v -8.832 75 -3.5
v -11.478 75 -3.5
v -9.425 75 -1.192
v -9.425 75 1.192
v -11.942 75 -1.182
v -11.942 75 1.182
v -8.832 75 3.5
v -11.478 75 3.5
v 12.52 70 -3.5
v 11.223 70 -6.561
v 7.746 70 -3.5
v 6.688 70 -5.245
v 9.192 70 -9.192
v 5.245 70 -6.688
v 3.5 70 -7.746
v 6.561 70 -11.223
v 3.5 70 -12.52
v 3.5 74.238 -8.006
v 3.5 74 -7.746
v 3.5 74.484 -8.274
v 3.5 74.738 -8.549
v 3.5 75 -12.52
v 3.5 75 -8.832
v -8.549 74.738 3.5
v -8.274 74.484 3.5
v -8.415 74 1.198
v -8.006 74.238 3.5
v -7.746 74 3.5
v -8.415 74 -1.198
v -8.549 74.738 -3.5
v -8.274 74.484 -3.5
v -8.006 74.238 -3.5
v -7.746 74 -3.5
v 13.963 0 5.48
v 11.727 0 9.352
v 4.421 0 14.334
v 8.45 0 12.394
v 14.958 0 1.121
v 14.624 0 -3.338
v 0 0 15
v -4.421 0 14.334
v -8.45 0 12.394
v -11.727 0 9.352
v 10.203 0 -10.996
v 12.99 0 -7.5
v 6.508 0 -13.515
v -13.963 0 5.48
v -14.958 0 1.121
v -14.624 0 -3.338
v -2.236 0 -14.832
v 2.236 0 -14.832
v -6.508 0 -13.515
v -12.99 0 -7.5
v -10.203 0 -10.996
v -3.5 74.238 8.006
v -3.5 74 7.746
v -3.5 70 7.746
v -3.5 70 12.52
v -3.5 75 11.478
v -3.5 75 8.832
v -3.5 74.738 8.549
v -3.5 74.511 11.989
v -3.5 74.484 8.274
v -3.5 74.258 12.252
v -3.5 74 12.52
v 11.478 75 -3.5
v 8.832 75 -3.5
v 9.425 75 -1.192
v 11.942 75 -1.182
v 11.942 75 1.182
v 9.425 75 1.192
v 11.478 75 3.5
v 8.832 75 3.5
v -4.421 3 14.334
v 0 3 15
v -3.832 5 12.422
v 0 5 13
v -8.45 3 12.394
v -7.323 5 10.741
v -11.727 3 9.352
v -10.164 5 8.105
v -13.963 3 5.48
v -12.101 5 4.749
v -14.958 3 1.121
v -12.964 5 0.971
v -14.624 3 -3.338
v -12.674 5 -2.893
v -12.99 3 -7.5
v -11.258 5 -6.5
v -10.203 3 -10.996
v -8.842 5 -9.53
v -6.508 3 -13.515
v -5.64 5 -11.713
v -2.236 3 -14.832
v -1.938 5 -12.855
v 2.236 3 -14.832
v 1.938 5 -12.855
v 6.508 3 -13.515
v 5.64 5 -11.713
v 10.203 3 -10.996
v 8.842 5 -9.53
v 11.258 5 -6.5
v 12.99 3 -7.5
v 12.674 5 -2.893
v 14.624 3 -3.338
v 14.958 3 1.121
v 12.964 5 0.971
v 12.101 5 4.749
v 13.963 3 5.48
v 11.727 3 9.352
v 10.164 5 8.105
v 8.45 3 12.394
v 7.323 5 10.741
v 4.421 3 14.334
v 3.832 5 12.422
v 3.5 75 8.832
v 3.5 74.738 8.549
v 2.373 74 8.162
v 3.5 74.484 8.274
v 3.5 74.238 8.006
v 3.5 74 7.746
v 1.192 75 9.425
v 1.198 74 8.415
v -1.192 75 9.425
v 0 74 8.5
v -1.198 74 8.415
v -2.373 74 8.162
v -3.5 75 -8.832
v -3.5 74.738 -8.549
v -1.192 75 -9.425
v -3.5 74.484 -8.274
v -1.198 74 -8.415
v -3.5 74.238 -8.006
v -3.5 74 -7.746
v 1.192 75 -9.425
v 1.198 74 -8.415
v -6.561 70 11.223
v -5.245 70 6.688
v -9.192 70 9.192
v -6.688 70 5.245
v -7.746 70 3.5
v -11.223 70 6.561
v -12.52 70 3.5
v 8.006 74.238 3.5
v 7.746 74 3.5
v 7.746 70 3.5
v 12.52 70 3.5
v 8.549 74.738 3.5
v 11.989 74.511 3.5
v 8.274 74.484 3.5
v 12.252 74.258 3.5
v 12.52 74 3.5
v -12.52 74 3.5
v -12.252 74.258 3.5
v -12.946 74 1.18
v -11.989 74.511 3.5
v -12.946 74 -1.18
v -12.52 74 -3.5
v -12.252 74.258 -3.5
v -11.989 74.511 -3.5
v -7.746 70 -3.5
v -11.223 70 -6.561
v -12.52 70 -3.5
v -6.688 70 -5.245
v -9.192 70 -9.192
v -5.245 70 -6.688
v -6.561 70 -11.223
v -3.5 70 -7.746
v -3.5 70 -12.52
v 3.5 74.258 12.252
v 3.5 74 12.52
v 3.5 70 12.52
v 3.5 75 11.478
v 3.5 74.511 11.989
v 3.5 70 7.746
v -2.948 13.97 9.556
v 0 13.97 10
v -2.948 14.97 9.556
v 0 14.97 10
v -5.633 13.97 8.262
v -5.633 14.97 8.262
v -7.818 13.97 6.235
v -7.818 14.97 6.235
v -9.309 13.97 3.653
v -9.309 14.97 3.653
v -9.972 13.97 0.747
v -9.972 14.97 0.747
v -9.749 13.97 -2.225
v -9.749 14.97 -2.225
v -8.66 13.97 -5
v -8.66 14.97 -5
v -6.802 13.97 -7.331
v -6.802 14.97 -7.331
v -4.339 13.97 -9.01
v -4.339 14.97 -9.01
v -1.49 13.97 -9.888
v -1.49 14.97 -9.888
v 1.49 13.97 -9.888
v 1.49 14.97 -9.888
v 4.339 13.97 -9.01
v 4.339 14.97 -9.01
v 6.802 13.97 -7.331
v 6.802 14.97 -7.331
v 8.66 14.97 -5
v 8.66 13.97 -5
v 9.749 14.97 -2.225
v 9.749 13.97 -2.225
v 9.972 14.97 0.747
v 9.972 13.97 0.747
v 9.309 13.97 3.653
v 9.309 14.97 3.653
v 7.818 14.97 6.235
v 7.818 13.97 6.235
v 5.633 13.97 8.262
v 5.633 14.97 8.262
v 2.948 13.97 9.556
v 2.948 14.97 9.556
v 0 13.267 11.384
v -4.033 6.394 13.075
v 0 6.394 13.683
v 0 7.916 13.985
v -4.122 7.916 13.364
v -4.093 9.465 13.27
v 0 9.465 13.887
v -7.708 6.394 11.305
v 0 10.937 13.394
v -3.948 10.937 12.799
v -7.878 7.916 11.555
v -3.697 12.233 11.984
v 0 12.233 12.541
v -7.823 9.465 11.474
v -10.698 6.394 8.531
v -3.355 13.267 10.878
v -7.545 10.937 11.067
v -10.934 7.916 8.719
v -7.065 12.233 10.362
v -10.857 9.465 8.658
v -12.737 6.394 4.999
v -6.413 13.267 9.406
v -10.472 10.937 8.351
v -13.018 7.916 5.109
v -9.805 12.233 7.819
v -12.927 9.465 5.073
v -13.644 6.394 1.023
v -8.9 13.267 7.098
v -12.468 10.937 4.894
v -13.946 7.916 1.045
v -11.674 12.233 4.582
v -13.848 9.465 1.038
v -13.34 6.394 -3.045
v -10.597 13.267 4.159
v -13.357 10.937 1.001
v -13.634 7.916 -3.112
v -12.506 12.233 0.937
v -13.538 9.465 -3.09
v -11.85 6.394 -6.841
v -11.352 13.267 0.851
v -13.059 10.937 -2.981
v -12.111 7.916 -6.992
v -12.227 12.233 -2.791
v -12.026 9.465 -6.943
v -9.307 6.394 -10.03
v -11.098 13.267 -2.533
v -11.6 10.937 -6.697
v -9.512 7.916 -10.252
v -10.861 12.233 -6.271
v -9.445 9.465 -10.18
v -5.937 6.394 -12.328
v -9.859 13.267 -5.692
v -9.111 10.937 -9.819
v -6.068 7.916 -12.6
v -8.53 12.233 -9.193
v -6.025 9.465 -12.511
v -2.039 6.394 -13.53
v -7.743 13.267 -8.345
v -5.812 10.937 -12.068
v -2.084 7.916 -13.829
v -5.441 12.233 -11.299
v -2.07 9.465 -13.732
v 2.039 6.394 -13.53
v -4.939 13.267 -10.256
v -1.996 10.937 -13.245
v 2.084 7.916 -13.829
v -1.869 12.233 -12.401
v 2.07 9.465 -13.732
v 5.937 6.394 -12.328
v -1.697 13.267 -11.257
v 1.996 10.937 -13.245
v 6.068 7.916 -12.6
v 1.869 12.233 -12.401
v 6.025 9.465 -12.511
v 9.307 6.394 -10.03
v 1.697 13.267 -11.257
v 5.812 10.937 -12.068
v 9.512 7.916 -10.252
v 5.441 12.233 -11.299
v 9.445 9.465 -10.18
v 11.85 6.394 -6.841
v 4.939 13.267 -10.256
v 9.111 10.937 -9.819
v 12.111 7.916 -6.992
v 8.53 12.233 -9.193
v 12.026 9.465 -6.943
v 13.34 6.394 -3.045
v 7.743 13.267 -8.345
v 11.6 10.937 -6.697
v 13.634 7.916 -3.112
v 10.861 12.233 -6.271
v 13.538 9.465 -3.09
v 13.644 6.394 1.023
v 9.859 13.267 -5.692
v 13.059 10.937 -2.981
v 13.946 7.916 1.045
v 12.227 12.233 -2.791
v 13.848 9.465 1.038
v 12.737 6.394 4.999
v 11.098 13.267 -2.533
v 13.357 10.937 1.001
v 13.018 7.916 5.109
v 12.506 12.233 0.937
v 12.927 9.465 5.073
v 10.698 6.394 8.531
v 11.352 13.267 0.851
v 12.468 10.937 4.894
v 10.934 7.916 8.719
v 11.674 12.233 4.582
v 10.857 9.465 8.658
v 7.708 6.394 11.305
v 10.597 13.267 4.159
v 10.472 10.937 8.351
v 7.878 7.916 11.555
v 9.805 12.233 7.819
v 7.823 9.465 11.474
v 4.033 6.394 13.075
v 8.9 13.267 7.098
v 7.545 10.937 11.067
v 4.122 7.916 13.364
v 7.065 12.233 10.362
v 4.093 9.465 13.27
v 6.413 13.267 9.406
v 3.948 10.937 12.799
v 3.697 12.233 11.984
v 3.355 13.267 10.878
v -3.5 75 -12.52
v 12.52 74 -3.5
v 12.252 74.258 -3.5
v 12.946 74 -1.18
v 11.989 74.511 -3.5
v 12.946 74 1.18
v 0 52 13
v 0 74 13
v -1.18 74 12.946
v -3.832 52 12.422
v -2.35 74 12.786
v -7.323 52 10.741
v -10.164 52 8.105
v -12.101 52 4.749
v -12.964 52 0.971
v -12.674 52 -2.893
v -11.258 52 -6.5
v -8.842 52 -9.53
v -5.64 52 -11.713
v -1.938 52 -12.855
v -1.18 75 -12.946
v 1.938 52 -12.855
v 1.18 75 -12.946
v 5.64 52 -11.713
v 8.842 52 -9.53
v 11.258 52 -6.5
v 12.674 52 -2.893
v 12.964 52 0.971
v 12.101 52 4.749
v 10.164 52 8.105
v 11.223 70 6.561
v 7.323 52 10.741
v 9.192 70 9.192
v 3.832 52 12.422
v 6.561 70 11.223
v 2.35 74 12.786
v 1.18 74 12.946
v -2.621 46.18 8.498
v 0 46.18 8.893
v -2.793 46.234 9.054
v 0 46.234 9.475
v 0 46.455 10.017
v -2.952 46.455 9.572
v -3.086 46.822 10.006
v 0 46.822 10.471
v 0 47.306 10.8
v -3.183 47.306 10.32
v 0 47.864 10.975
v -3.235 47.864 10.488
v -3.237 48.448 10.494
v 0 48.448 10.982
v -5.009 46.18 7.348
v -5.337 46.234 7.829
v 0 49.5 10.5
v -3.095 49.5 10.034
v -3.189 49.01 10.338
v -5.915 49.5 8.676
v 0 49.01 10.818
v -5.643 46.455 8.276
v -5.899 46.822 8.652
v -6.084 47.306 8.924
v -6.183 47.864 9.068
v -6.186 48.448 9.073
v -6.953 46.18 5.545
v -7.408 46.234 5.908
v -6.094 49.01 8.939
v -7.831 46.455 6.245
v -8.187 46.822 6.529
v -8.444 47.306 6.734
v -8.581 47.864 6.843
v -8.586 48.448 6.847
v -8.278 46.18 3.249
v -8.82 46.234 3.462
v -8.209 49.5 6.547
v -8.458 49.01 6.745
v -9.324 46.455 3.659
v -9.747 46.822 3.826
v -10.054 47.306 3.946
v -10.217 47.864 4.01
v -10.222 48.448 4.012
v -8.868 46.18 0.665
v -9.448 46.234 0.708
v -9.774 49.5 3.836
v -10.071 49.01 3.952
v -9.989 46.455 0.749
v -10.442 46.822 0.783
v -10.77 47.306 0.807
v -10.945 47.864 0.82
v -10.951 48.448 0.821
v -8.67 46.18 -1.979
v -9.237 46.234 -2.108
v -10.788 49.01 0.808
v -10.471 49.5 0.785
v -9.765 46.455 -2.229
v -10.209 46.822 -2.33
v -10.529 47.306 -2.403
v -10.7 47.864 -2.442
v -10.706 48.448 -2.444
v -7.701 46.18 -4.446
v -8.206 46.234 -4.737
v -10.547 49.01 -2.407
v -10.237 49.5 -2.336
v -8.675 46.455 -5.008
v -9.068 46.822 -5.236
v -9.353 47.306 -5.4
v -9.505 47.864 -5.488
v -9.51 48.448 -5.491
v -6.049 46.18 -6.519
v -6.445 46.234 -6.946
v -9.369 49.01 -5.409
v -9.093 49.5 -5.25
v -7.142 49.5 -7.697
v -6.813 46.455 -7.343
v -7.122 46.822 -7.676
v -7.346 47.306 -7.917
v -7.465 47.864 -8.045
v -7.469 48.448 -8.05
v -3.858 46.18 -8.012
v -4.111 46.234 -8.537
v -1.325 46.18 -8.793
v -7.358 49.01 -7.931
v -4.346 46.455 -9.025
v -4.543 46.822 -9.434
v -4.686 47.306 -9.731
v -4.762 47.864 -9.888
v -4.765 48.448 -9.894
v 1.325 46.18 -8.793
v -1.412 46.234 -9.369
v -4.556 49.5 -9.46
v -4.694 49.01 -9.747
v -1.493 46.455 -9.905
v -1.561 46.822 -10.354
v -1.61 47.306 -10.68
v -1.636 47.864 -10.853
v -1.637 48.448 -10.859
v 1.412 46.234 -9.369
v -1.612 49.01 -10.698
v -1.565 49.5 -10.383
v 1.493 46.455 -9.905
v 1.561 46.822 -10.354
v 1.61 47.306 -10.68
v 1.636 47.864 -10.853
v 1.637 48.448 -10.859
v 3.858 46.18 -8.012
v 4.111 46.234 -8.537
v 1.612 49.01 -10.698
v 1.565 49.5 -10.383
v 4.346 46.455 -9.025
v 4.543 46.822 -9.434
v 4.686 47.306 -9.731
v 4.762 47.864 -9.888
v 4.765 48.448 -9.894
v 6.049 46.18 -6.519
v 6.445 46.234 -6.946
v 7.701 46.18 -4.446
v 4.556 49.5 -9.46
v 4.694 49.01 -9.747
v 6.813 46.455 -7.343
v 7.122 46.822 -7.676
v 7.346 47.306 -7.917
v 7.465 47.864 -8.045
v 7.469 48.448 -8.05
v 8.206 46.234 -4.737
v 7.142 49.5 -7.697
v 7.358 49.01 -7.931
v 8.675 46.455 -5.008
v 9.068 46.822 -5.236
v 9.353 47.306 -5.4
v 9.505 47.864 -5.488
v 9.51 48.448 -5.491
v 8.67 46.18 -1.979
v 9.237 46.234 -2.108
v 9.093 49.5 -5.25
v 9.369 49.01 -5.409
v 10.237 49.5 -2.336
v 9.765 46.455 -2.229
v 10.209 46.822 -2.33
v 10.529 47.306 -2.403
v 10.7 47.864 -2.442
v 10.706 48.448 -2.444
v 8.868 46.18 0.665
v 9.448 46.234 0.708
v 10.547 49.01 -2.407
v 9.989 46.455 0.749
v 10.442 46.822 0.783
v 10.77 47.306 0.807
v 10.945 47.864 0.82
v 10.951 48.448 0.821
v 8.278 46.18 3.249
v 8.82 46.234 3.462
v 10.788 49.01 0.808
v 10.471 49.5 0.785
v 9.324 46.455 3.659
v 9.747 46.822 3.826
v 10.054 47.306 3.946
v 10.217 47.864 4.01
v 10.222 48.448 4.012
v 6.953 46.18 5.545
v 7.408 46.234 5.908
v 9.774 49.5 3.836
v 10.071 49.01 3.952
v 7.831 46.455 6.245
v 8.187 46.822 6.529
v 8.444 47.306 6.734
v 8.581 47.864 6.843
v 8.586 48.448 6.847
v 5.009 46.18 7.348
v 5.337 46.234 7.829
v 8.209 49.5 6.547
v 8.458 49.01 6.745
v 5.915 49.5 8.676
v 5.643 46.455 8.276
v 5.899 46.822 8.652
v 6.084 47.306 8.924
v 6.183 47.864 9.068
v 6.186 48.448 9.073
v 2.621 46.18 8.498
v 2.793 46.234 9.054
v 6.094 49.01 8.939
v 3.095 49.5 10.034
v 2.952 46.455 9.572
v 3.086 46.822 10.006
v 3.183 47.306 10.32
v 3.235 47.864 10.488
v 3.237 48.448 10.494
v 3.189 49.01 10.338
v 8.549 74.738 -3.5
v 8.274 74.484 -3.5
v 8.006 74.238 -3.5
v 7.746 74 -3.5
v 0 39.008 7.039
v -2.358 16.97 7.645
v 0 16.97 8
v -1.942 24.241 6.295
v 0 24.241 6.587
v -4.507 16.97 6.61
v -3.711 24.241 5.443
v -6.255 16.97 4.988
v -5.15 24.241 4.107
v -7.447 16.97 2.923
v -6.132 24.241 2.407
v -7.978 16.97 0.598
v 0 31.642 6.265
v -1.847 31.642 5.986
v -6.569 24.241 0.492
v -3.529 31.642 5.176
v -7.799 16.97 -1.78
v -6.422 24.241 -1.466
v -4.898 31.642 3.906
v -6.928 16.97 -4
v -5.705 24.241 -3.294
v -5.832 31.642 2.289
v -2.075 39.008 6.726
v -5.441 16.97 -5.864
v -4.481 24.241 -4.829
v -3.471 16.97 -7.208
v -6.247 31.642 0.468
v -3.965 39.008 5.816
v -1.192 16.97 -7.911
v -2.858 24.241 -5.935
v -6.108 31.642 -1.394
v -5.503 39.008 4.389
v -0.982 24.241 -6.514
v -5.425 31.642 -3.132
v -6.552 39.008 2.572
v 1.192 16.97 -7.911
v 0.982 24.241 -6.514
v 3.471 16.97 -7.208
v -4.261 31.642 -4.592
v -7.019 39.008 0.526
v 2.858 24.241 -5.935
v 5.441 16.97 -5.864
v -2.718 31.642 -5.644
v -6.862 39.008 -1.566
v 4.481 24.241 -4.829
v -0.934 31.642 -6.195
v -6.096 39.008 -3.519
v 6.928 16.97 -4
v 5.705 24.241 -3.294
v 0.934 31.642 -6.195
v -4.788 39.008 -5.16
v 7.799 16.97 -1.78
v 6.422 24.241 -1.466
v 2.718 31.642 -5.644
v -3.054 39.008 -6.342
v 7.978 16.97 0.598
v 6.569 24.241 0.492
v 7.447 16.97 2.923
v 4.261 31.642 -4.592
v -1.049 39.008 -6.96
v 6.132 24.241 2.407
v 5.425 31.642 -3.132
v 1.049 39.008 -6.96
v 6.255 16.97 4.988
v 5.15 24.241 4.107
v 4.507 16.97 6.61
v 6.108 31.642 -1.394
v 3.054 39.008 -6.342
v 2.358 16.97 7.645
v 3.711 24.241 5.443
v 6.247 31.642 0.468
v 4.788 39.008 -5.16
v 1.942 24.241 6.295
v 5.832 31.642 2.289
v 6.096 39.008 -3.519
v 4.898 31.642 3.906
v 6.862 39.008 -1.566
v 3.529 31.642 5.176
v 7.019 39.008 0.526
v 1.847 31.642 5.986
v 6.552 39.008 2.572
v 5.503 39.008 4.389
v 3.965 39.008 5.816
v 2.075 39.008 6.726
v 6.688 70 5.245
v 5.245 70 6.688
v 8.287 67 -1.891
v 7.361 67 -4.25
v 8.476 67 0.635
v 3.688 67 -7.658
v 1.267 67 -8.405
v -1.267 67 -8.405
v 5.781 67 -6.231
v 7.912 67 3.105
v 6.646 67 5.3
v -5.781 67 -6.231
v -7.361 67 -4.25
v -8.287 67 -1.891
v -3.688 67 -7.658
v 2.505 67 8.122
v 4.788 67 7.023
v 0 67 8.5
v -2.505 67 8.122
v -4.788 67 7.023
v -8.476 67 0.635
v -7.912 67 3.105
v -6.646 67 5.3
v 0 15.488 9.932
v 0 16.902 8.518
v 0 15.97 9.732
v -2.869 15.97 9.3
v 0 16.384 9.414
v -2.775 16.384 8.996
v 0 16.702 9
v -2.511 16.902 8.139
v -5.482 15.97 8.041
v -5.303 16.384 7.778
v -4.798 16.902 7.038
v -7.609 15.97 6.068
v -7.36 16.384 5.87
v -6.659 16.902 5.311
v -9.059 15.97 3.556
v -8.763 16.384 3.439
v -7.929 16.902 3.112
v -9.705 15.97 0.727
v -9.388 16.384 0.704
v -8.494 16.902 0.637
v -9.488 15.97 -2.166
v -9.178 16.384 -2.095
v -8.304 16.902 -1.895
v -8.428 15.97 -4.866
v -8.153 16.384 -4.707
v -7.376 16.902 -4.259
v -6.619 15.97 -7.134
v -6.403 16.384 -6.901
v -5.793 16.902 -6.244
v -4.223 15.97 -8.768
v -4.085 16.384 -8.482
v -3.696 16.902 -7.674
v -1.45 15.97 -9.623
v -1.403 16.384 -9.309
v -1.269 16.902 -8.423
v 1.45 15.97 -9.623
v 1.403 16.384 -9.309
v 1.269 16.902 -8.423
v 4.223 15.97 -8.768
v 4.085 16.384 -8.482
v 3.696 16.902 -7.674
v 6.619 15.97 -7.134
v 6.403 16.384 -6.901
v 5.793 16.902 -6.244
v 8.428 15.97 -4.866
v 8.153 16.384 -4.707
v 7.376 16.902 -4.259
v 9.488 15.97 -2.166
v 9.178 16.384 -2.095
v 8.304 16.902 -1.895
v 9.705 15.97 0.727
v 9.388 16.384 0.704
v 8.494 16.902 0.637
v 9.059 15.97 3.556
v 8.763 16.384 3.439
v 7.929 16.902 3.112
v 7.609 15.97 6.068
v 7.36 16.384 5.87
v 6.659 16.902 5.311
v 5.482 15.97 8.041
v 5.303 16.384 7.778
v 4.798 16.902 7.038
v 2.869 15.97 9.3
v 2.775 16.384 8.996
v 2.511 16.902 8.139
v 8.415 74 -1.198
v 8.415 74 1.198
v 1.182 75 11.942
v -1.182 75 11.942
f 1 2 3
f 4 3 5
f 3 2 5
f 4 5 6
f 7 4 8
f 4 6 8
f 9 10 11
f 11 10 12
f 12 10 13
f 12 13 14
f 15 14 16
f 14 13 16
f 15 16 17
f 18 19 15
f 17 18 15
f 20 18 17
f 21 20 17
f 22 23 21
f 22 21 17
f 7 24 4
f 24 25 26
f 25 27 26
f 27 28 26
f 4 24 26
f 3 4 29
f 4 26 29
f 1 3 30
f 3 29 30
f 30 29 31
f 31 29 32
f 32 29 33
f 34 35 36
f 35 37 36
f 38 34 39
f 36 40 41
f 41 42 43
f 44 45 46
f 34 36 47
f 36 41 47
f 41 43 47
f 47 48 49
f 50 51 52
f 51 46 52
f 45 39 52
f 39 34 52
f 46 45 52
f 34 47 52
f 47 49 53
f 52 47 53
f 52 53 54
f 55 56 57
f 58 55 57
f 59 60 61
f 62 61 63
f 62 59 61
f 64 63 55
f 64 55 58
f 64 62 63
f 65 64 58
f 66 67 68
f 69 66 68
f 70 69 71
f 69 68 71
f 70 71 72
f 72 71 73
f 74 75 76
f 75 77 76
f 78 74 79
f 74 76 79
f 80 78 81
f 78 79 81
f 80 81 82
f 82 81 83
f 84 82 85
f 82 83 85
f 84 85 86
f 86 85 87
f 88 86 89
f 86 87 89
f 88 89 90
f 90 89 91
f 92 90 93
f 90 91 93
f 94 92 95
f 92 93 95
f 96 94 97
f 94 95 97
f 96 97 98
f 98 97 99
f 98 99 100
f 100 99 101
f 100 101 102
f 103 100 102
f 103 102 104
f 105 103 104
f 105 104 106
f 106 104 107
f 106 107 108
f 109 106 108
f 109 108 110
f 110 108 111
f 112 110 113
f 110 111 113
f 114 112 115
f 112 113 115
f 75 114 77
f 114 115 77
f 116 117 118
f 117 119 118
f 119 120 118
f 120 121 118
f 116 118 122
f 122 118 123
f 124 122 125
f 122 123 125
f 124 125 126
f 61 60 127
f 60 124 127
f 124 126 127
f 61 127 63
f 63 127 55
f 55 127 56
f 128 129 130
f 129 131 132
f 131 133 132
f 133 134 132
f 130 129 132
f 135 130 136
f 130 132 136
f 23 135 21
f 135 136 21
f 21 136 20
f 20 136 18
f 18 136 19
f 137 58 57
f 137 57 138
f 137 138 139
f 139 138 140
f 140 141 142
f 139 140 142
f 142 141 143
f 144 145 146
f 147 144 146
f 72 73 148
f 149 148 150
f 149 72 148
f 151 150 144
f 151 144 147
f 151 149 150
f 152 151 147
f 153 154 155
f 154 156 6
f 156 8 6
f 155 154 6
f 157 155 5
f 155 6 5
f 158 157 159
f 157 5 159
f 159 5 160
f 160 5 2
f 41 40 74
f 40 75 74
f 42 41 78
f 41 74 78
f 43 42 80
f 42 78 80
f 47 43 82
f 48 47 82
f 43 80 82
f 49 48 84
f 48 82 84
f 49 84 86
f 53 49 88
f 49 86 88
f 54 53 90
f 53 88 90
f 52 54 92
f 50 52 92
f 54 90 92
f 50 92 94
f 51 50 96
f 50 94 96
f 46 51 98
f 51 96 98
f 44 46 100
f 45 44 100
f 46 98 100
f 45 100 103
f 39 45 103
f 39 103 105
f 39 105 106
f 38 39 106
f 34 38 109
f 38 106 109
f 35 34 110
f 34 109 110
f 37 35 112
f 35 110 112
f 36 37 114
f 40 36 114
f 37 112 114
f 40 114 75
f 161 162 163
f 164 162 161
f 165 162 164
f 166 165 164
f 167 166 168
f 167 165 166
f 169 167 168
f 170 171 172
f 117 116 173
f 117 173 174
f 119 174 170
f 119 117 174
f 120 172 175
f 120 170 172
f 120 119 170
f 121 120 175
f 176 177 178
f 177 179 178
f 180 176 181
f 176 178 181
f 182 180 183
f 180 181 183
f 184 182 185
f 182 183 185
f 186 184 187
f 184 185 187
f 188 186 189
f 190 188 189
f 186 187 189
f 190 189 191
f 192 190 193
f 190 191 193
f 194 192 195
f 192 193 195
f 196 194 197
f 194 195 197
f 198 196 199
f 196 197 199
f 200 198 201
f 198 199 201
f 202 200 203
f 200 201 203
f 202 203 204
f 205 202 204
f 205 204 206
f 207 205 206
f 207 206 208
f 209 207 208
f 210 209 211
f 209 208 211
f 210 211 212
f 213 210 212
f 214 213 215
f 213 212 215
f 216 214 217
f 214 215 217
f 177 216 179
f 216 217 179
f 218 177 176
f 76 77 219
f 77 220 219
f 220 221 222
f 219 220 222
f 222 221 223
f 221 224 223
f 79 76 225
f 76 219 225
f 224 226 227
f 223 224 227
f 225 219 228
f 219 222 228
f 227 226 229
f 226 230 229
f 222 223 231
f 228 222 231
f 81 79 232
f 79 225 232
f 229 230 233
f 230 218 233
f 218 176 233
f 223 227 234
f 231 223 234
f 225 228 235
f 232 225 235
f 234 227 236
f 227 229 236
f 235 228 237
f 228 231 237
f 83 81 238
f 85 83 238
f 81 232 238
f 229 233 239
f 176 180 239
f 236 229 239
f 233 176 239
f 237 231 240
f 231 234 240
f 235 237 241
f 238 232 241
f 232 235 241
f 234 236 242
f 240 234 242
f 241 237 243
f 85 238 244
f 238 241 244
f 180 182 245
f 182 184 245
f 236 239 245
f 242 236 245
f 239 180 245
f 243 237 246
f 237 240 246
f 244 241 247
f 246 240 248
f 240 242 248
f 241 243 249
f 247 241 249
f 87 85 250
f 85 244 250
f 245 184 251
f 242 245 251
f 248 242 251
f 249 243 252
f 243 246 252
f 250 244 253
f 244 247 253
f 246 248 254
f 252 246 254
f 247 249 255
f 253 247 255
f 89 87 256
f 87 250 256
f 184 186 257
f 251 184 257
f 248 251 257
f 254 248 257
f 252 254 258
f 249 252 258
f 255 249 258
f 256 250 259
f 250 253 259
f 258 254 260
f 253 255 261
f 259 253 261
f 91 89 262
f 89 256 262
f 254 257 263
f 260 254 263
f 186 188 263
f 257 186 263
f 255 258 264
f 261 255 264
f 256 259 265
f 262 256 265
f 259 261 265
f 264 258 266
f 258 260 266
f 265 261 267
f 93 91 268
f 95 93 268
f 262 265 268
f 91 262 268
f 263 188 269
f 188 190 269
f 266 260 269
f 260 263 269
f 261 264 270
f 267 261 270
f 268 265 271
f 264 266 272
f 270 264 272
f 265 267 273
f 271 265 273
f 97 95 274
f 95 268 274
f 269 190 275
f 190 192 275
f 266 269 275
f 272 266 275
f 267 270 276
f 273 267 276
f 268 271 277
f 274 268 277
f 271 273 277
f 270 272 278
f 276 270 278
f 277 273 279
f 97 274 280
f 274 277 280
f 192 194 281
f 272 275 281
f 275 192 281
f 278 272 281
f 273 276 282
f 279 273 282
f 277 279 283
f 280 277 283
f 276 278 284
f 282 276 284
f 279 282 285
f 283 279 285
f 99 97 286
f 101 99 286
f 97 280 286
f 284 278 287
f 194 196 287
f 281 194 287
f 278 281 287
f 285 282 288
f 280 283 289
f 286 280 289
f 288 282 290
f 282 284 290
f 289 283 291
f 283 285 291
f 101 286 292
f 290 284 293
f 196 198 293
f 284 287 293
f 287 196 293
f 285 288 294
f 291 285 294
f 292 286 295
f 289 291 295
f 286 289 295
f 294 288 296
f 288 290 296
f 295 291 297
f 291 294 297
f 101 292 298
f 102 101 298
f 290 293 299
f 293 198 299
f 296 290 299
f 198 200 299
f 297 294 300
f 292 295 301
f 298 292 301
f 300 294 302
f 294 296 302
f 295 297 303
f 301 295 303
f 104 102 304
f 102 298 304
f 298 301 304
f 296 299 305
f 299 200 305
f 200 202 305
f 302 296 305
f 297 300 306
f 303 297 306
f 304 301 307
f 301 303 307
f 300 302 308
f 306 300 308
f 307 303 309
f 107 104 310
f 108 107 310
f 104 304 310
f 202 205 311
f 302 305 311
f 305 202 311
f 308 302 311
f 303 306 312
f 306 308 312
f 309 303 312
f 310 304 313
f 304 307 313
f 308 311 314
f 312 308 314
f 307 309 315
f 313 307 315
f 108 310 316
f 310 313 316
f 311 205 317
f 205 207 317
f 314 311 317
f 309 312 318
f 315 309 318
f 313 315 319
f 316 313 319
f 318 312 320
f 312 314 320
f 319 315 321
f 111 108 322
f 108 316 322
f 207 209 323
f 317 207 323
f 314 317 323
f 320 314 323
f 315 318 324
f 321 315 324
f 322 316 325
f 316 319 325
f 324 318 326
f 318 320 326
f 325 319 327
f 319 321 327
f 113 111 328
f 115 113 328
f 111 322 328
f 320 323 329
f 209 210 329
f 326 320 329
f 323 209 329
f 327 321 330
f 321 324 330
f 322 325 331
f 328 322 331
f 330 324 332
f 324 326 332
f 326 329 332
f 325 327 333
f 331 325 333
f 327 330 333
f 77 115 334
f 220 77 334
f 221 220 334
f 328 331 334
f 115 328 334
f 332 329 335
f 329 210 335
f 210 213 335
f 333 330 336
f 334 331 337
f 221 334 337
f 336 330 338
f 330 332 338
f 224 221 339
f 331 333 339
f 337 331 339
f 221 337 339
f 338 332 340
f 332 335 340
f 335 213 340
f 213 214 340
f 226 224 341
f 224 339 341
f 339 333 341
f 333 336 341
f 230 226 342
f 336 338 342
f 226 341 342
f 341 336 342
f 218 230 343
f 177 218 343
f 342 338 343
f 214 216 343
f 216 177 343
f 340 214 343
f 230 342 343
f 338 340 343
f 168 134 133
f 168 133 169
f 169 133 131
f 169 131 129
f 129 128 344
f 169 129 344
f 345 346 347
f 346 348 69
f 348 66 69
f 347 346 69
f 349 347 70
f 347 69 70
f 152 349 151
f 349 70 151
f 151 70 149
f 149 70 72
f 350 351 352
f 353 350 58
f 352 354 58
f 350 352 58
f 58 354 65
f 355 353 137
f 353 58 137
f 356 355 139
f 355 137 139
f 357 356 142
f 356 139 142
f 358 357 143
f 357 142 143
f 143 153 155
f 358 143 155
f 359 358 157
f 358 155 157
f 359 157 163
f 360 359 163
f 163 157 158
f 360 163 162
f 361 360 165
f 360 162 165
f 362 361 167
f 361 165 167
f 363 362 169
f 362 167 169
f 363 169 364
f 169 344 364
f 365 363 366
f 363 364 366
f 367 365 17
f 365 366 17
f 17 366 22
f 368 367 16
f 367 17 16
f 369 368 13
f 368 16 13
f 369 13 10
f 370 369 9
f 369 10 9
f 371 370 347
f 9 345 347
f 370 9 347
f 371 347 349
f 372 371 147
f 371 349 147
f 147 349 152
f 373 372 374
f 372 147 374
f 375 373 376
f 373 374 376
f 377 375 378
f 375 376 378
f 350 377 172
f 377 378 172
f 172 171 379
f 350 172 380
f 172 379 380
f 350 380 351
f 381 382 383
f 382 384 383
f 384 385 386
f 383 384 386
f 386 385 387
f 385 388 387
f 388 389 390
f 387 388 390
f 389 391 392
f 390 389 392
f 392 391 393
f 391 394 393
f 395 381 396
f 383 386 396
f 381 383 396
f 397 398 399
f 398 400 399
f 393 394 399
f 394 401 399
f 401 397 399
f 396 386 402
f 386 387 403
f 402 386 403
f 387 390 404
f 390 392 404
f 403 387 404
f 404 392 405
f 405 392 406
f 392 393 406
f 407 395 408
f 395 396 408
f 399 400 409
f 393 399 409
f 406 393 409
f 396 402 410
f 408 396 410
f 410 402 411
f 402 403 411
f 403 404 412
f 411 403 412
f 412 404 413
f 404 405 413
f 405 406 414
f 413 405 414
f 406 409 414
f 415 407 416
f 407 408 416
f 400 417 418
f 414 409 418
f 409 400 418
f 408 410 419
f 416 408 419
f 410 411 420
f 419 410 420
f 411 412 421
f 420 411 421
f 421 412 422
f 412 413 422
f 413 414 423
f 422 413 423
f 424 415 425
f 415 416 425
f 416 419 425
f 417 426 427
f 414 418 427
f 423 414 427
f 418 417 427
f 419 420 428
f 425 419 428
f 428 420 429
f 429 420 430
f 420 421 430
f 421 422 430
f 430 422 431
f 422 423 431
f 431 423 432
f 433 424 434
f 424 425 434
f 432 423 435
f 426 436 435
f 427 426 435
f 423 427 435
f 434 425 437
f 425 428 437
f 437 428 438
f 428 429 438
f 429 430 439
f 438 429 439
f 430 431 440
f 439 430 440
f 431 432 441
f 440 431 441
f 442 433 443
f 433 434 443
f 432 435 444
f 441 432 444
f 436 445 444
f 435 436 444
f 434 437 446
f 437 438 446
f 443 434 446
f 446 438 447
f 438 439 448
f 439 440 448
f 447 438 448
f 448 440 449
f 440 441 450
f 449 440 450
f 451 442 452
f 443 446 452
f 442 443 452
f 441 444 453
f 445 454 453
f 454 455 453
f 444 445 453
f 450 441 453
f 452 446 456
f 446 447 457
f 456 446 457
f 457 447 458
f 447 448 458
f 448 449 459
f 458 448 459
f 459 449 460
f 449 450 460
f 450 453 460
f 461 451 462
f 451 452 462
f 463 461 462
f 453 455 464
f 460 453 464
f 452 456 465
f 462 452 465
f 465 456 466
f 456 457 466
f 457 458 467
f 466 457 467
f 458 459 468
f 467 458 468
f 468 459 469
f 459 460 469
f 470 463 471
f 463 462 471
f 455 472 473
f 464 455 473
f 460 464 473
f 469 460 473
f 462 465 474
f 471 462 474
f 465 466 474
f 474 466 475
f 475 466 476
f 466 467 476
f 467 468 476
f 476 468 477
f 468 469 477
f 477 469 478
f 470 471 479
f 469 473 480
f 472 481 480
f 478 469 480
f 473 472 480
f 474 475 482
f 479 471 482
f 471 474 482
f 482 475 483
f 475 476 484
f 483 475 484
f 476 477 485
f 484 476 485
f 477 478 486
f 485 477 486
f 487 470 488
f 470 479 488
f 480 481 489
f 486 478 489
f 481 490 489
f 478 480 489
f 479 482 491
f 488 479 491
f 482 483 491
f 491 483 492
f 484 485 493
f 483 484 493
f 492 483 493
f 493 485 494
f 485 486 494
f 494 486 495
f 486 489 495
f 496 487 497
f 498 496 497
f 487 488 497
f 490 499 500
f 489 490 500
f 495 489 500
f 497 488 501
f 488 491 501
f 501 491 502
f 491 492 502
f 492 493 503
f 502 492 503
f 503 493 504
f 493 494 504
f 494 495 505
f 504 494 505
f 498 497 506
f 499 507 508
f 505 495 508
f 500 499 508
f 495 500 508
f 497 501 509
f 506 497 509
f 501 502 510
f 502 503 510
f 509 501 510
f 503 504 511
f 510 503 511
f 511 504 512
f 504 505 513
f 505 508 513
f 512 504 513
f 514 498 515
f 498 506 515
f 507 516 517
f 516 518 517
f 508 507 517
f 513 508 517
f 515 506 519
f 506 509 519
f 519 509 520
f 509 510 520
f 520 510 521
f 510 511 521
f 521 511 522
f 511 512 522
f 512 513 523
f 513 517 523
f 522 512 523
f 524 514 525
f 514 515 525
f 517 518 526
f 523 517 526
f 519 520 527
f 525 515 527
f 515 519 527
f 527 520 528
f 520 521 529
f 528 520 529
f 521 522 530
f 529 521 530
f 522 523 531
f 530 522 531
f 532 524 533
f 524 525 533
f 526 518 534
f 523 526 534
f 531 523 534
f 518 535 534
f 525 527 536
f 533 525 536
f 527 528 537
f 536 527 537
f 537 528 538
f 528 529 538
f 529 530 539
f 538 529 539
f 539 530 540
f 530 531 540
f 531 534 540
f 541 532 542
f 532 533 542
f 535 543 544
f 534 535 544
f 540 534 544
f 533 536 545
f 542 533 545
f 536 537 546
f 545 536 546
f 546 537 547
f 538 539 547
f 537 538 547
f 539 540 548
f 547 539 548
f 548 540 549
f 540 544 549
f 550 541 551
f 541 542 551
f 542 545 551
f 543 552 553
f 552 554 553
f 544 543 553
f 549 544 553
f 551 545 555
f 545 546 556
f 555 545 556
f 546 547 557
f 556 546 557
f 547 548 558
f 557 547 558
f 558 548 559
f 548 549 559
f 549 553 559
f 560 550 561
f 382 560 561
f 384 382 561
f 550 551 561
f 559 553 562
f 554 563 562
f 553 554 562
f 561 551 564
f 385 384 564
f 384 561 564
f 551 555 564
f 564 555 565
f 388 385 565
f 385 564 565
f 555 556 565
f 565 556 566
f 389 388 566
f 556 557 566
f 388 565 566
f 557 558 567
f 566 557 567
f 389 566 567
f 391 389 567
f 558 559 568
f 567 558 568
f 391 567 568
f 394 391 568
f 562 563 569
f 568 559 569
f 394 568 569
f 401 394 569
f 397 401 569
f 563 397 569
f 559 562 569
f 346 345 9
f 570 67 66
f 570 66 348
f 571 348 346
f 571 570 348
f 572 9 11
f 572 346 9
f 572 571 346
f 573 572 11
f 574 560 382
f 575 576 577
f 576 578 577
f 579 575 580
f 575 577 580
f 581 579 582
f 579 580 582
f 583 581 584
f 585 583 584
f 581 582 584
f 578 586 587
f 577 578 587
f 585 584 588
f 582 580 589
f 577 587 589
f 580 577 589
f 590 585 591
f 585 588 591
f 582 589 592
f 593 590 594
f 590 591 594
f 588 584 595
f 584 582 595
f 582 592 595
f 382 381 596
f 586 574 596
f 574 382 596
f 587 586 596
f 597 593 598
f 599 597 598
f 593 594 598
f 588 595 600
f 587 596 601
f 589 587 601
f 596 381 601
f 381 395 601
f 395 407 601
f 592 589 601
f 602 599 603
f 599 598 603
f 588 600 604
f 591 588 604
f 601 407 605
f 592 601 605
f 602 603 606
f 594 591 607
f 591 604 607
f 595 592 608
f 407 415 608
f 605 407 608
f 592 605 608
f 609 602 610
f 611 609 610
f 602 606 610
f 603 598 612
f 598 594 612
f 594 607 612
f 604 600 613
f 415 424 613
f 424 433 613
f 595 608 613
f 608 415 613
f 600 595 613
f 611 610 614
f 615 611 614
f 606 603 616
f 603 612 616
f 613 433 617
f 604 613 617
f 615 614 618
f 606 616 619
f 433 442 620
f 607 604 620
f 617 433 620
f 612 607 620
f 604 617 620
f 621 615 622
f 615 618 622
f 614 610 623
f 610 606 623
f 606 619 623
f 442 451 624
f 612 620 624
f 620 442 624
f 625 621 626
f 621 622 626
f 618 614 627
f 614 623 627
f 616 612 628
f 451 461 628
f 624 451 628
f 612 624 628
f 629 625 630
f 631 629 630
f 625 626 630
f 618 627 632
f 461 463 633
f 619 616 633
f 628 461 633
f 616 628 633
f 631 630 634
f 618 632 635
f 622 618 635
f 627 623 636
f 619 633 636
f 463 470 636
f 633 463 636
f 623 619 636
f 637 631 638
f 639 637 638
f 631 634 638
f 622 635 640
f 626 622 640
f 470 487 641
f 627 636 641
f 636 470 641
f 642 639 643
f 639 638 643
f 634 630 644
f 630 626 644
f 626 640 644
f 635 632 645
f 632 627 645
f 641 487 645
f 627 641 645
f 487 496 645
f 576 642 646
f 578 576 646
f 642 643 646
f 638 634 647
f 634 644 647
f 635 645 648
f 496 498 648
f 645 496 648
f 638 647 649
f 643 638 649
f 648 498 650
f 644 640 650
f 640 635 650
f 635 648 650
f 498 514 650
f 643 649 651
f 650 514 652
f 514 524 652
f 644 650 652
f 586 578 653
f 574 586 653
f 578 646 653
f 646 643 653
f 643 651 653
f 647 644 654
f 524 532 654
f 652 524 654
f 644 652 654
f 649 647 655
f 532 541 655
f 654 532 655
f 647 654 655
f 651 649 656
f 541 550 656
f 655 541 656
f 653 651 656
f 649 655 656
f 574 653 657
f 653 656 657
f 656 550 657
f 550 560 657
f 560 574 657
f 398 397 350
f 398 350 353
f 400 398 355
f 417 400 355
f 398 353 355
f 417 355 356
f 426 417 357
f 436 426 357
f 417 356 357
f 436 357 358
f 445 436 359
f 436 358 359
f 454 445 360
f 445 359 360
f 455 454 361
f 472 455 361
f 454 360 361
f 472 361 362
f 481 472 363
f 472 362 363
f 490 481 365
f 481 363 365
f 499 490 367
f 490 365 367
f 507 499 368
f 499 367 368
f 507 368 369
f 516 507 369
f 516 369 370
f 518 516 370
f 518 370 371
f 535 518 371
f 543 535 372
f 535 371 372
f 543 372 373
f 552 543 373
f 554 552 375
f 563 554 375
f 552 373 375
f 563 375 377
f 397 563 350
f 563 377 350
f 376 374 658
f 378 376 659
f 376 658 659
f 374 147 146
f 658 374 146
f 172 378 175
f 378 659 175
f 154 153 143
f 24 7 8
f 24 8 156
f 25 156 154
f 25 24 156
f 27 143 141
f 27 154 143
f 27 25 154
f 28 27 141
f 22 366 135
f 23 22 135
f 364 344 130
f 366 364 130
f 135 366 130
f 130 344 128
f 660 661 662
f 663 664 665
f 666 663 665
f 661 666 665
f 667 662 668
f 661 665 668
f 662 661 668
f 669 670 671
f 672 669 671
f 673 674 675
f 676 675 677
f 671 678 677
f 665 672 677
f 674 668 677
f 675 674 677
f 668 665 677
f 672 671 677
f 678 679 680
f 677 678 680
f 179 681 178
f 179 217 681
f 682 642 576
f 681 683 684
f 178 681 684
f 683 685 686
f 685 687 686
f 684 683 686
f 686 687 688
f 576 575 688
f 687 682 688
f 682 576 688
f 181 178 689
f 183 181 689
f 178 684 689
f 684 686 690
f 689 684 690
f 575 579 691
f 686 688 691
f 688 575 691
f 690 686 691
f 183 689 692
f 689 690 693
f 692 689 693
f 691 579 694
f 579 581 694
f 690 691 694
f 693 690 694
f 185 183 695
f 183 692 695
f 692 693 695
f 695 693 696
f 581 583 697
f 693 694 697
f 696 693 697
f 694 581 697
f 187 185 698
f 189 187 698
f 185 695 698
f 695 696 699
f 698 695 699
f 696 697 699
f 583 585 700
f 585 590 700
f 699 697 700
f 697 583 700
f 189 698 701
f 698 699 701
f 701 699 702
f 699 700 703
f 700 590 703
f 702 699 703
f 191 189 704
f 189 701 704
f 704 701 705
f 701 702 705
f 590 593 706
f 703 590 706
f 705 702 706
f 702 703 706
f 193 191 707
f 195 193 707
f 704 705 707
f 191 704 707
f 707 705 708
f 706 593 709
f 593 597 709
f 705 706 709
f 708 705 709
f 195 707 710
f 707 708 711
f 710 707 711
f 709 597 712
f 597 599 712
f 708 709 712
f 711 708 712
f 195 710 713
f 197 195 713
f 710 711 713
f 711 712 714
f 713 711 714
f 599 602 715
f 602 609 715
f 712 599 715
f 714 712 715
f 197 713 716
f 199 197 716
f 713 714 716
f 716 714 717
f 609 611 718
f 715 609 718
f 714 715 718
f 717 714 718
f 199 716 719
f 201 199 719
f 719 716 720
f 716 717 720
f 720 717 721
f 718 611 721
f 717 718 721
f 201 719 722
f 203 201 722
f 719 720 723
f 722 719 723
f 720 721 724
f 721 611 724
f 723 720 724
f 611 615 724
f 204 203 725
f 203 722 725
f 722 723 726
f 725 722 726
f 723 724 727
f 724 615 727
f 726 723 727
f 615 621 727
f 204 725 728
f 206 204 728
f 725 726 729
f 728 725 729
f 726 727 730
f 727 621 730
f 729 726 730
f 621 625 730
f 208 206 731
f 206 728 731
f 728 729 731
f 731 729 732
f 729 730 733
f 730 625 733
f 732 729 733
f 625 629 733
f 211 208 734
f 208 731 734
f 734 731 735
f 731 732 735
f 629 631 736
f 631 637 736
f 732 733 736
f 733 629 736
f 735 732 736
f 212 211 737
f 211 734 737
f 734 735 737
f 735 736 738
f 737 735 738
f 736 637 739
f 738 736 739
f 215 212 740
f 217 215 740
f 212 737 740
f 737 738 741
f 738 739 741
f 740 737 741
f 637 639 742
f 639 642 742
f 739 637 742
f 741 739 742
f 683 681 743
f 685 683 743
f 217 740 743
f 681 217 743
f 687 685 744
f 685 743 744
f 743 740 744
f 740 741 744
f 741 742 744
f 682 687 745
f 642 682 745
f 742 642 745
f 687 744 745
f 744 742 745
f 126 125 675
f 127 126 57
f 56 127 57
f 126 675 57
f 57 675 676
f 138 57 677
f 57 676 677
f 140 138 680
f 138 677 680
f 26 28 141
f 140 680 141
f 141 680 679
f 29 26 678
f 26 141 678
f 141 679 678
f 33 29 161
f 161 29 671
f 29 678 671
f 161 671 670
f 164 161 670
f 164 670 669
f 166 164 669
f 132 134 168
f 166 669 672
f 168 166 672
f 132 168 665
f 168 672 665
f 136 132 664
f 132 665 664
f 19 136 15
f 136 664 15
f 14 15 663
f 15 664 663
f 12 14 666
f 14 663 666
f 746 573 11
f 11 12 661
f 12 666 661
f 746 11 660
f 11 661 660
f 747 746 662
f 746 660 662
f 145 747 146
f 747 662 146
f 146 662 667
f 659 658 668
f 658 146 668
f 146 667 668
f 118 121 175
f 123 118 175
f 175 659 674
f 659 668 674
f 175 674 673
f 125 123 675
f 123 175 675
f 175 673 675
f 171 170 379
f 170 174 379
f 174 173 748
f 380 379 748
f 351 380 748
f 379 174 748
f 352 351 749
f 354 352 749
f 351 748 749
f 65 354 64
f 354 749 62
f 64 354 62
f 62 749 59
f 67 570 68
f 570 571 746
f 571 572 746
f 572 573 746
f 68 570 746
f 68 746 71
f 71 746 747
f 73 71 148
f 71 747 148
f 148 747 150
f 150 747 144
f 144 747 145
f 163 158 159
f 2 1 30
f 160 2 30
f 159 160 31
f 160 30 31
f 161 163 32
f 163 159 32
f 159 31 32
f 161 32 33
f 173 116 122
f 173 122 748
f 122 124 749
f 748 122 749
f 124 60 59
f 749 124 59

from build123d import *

# Parameters (mm, degrees)
KES_EKSTR_ZYON1_DEPTH = 5
PAH1_SIZE             = 1


with BuildPart() as part:
    # Çizim1 → Döndür1 (revolve)
    with BuildSketch(Plane.XY, mode=Mode.PRIVATE) as d_nd_r1_sk:
        with BuildLine():
            Line((0, 0), (-15, 0))
            Line((-15, 0), (-15, 3))
            Line((-15, 3), (-13, 5))
            ThreePointArc((-13, 5), (-13.688325627, 10.216881481), (-10, 13.97))
            Line((-10, 13.97), (-10, 14.97))
            ThreePointArc((-10, 14.97), (-9.414213562, 16.384213562), (-8, 16.97))
            ThreePointArc((-8, 16.97), (-6.26471847, 31.641681769), (-8.892788281, 46.18))
            ThreePointArc((-8.892788281, 46.18), (-10.800156882, 47.30566855), (-10.5, 49.5))
            Line((-10.5, 49.5), (-13, 52))
            Line((-13, 52), (-13, 70))
            Line((-13, 70), (-13, 75))
            Line((-13, 75), (-8.5, 75))
            Line((-8.5, 75), (-8.5, 70))
            Line((-8.5, 70), (-8.5, 67))
            Line((-8.5, 67), (0, 67))
            Line((0, 67), (0, 0))
        make_face()
    revolve(d_nd_r1_sk.sketch.rotate(Axis((0, 78.14654641, 0), (0, -1, 0)), 270), axis=Axis((0, 78.14654641, 0), (0, -1, 0)))

    # Çizim3 → Kes-Ekstrüzyon1 (cut)
    with BuildSketch(Plane(origin=(0, 75, 0), x_dir=(1, 0, 0), z_dir=(0, 1, 0))):
        with BuildLine():
            Line((-12.519984026, 3.5), (-7.745966692, 3.5))
            ThreePointArc((-7.745966692, 3.5), (-6.01040764, 6.01040764), (-3.5, 7.745966692))
            Line((-3.5, 7.745966692), (-3.5, 12.519984026))
            ThreePointArc((-3.5, 12.519984026), (-9.192388155, 9.192388155), (-12.519984026, 3.5))
        make_face()
        with BuildLine():
            Line((-12.519984026, -3.5), (-7.745966692, -3.5))
            ThreePointArc((-7.745966692, -3.5), (-6.01040764, -6.01040764), (-3.5, -7.745966692))
            Line((-3.5, -7.745966692), (-3.5, -12.519984026))
            ThreePointArc((-3.5, -12.519984026), (-9.192388155, -9.192388155), (-12.519984026, -3.5))
        make_face()
        with BuildLine():
            Line((7.745966692, -3.5), (12.519984026, -3.5))
            ThreePointArc((12.519984026, -3.5), (9.192388155, -9.192388155), (3.5, -12.519984026))
            Line((3.5, -12.519984026), (3.5, -7.745966692))
            ThreePointArc((3.5, -7.745966692), (6.01040764, -6.01040764), (7.745966692, -3.5))
        make_face()
        with BuildLine():
            Line((12.519984026, 3.5), (7.745966692, 3.5))
            ThreePointArc((7.745966692, 3.5), (6.01040764, 6.01040764), (3.5, 7.745966692))
            Line((3.5, 7.745966692), (3.5, 12.519984026))
            ThreePointArc((3.5, 12.519984026), (9.192388155, 9.192388155), (12.519984026, 3.5))
        make_face()
    extrude(amount=-KES_EKSTR_ZYON1_DEPTH, mode=Mode.SUBTRACT)

    # Pah1
    pah1_edges = [part.edges().sort_by_distance(p)[0] for p in [
        (13, 75, 0),
        (-13, 75, 0),
        (-1.766381565, 75, 12.879436951),
        (8.5, 75, 0),
        (0, 75, -8.5),
        (-8.5, 75, 0),
        (-1.790151267, 75, 8.309353672),
    ]]
    chamfer(pah1_edges, length=PAH1_SIZE)


solid = part.part
